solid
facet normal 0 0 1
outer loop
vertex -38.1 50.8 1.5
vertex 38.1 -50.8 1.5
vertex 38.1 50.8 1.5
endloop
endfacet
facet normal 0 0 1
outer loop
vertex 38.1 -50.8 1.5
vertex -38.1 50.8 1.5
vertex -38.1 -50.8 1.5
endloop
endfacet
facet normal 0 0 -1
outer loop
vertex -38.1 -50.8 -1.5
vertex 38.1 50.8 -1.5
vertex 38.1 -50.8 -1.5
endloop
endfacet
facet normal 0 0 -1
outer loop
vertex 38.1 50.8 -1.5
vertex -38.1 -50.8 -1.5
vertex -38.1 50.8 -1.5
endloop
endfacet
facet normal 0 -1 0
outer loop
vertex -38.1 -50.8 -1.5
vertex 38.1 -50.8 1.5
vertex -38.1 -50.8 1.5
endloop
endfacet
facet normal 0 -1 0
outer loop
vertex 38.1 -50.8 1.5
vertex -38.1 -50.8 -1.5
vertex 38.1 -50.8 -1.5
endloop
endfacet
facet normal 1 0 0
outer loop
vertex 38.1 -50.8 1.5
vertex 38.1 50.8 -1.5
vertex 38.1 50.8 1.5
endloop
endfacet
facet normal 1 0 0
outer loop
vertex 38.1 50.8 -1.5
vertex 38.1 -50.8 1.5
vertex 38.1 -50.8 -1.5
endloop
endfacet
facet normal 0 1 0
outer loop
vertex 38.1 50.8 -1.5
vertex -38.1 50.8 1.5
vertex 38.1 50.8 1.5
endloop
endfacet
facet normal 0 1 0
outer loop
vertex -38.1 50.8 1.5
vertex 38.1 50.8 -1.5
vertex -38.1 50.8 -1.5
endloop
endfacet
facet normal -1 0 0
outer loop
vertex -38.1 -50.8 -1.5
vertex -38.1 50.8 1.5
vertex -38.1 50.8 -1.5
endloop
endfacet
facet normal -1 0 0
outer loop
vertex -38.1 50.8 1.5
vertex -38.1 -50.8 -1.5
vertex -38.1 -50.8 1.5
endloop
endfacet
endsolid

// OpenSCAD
//Plate for maintaining orthogonality when measuring material sheets
length = 76.2;
width = 101.6;
height = 3.0;
cube([length,width,height], true);
